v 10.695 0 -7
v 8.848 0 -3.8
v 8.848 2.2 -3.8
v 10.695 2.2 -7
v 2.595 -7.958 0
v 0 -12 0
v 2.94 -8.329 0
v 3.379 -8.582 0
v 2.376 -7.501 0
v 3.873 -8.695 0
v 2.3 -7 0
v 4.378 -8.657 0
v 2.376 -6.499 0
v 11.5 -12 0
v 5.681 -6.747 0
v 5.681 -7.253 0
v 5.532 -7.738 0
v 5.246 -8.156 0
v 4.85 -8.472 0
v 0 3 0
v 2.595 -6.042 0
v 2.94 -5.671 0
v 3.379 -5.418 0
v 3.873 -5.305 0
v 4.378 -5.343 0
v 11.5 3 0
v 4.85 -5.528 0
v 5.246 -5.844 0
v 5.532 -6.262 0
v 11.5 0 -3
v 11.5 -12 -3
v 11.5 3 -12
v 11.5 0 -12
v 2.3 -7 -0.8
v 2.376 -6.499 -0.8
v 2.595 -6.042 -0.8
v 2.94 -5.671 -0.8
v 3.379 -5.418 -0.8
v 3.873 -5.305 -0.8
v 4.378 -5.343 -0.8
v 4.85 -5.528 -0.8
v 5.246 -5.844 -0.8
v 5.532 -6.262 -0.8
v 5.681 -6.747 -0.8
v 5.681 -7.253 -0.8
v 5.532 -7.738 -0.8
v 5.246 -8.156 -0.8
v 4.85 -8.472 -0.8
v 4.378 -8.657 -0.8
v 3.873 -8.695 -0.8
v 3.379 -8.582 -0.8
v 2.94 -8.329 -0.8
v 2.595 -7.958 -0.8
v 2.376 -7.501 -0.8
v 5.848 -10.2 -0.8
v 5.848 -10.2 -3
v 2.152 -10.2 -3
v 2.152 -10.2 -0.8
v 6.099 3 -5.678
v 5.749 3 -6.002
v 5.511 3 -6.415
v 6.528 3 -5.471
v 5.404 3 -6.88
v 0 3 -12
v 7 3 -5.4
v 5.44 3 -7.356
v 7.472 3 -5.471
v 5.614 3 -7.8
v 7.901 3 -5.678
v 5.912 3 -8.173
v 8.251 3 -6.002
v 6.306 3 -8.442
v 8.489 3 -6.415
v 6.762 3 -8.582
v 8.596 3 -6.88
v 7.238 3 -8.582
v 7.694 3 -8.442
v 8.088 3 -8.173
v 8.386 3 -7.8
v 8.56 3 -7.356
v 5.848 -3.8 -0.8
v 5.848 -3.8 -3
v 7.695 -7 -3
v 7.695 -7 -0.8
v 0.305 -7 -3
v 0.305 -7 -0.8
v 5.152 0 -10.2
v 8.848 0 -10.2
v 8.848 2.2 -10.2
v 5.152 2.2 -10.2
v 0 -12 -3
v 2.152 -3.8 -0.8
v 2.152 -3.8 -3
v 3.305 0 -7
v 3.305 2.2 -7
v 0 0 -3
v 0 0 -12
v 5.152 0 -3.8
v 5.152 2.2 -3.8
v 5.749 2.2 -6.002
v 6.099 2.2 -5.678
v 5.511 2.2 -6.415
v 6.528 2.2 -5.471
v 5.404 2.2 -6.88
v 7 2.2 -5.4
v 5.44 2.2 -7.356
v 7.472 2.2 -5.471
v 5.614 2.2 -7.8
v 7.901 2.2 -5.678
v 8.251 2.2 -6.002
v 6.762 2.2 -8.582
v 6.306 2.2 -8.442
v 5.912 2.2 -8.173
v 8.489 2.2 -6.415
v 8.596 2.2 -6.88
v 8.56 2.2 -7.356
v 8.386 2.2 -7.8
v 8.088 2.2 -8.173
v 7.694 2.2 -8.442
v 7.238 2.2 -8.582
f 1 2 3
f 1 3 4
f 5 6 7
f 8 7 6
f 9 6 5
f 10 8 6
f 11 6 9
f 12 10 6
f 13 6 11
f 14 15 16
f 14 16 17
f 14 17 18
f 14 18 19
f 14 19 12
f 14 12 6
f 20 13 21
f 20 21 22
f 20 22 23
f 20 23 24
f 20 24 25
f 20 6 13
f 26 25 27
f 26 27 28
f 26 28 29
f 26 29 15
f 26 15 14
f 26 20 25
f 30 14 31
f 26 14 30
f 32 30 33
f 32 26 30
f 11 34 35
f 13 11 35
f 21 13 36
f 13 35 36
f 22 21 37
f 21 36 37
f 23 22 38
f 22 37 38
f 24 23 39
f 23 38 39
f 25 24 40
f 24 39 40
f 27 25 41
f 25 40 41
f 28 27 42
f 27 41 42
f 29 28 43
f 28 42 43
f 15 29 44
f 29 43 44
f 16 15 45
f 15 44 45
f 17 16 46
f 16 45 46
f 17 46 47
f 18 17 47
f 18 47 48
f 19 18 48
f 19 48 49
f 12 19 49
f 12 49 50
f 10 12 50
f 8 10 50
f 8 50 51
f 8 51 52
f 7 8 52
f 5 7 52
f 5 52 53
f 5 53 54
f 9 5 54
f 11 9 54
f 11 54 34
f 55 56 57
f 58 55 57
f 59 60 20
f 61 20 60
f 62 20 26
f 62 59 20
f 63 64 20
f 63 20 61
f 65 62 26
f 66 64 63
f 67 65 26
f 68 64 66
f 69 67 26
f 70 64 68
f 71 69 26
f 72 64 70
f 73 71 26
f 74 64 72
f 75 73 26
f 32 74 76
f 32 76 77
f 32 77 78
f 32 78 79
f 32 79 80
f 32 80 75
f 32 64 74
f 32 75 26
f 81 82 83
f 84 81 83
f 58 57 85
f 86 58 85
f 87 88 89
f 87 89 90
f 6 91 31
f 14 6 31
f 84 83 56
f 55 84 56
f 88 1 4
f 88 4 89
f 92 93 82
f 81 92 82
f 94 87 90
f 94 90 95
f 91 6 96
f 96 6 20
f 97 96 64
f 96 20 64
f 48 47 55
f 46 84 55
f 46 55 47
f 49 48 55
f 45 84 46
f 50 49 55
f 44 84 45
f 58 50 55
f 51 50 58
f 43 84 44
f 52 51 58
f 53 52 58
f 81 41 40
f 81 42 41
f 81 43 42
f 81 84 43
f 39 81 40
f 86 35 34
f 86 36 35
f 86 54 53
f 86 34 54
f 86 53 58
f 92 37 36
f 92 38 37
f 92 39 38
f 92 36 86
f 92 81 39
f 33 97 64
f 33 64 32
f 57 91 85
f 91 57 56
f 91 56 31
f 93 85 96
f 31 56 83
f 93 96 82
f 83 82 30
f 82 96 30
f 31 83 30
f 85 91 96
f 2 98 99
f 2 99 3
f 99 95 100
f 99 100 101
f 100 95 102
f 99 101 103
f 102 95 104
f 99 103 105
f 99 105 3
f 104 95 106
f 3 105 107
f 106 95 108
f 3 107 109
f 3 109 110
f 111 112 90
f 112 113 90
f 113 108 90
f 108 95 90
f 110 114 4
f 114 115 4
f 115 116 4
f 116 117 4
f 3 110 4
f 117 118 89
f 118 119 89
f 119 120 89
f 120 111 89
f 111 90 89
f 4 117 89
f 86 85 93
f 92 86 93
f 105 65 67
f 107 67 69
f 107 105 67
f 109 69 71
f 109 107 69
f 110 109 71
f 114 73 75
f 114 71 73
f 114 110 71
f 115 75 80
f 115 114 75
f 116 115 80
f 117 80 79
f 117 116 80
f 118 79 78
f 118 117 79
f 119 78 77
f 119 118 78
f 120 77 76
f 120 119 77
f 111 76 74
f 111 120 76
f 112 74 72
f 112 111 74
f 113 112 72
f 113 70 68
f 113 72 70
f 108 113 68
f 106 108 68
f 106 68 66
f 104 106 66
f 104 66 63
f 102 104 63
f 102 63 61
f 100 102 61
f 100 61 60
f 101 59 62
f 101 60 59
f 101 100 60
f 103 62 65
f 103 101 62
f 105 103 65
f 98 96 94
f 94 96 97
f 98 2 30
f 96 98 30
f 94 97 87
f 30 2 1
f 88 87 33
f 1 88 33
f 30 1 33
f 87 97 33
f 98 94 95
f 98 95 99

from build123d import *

# Parameters (mm, degrees)
SKETCH1_W           = 11.5
SKETCH1_H           = 12
BOSS_EXTRUDE1_DEPTH = 3
SKETCH1_4_W         = 11.5
SKETCH1_4_H         = 3
BOSS_EXTRUDE2_DEPTH = 12
SKETCH1_5_R         = 1.6
CUT_EXTRUDE1_DEPTH  = 2.2
SKETCH1_6_R         = 1.6
CUT_EXTRUDE2_DEPTH  = 21.5
SKETCH3_R           = 1.7
CUT_EXTRUDE3_DEPTH  = 2.2
SKETCH3_3_R         = 1.7
CUT_EXTRUDE4_DEPTH  = 19.901058171


with BuildPart() as part:
    # Sketch1 → Boss-Extrude1 (new body)
    with BuildSketch(Plane(origin=(0, 0, 0), x_dir=(1, 0, 0), z_dir=(0, 1, 0))):
        with Locations((5.75, 6)):
            Rectangle(SKETCH1_W, SKETCH1_H)
    extrude(amount=BOSS_EXTRUDE1_DEPTH)

    # Sketch1<4> → Boss-Extrude2 (add)
    with BuildSketch(Plane(origin=(0, 0, 0), x_dir=(1, 0, 0), z_dir=(0, 1, 0))):
        with Locations((5.75, 1.5)):
            Rectangle(SKETCH1_4_W, SKETCH1_4_H)
    extrude(amount=-BOSS_EXTRUDE2_DEPTH)

    # Sketch1<5> → Cut-Extrude1 (cut)
    with BuildSketch(Plane(origin=(0, 0, 0), x_dir=(1, 0, 0), z_dir=(0, 1, 0))):
        Polygon((5.152479139, 3.8), (8.847520861, 3.8), (10.695041723, 7), (8.847520861, 10.2), (5.152479139, 10.2), (3.304958277, 7), align=None)
        with Locations((7, 7)):
            Circle(SKETCH1_5_R, mode=Mode.SUBTRACT)
    extrude(amount=CUT_EXTRUDE1_DEPTH, mode=Mode.SUBTRACT)

    # Sketch1<6> → Cut-Extrude2 (cut, through all)
    with BuildSketch(Plane(origin=(0, 0, 0), x_dir=(1, 0, 0), z_dir=(0, 1, 0))):
        with Locations((7, 7)):
            Circle(SKETCH1_6_R)
    extrude(amount=CUT_EXTRUDE2_DEPTH, mode=Mode.SUBTRACT)

    # Sketch3 → Cut-Extrude3 (cut)
    with BuildSketch(Plane(origin=(0, 0, -3), x_dir=(-1, 0, 0), z_dir=(0, 0, -1))):
        Polygon((-5.847520861, -3.8), (-7.695041723, -7), (-5.847520861, -10.2), (-2.152479139, -10.2), (-0.304958277, -7), (-2.152479139, -3.8), align=None)
        with Locations((-4, -7)):
            Circle(SKETCH3_R, mode=Mode.SUBTRACT)
    extrude(amount=-CUT_EXTRUDE3_DEPTH, mode=Mode.SUBTRACT)

    # Sketch3<3> → Cut-Extrude4 (cut, through all)
    with BuildSketch(Plane(origin=(0, 0, -3), x_dir=(-1, 0, 0), z_dir=(0, 0, -1))):
        with Locations((-4, -7)):
            Circle(SKETCH3_3_R)
    extrude(amount=-CUT_EXTRUDE4_DEPTH, mode=Mode.SUBTRACT)


solid = part.part
